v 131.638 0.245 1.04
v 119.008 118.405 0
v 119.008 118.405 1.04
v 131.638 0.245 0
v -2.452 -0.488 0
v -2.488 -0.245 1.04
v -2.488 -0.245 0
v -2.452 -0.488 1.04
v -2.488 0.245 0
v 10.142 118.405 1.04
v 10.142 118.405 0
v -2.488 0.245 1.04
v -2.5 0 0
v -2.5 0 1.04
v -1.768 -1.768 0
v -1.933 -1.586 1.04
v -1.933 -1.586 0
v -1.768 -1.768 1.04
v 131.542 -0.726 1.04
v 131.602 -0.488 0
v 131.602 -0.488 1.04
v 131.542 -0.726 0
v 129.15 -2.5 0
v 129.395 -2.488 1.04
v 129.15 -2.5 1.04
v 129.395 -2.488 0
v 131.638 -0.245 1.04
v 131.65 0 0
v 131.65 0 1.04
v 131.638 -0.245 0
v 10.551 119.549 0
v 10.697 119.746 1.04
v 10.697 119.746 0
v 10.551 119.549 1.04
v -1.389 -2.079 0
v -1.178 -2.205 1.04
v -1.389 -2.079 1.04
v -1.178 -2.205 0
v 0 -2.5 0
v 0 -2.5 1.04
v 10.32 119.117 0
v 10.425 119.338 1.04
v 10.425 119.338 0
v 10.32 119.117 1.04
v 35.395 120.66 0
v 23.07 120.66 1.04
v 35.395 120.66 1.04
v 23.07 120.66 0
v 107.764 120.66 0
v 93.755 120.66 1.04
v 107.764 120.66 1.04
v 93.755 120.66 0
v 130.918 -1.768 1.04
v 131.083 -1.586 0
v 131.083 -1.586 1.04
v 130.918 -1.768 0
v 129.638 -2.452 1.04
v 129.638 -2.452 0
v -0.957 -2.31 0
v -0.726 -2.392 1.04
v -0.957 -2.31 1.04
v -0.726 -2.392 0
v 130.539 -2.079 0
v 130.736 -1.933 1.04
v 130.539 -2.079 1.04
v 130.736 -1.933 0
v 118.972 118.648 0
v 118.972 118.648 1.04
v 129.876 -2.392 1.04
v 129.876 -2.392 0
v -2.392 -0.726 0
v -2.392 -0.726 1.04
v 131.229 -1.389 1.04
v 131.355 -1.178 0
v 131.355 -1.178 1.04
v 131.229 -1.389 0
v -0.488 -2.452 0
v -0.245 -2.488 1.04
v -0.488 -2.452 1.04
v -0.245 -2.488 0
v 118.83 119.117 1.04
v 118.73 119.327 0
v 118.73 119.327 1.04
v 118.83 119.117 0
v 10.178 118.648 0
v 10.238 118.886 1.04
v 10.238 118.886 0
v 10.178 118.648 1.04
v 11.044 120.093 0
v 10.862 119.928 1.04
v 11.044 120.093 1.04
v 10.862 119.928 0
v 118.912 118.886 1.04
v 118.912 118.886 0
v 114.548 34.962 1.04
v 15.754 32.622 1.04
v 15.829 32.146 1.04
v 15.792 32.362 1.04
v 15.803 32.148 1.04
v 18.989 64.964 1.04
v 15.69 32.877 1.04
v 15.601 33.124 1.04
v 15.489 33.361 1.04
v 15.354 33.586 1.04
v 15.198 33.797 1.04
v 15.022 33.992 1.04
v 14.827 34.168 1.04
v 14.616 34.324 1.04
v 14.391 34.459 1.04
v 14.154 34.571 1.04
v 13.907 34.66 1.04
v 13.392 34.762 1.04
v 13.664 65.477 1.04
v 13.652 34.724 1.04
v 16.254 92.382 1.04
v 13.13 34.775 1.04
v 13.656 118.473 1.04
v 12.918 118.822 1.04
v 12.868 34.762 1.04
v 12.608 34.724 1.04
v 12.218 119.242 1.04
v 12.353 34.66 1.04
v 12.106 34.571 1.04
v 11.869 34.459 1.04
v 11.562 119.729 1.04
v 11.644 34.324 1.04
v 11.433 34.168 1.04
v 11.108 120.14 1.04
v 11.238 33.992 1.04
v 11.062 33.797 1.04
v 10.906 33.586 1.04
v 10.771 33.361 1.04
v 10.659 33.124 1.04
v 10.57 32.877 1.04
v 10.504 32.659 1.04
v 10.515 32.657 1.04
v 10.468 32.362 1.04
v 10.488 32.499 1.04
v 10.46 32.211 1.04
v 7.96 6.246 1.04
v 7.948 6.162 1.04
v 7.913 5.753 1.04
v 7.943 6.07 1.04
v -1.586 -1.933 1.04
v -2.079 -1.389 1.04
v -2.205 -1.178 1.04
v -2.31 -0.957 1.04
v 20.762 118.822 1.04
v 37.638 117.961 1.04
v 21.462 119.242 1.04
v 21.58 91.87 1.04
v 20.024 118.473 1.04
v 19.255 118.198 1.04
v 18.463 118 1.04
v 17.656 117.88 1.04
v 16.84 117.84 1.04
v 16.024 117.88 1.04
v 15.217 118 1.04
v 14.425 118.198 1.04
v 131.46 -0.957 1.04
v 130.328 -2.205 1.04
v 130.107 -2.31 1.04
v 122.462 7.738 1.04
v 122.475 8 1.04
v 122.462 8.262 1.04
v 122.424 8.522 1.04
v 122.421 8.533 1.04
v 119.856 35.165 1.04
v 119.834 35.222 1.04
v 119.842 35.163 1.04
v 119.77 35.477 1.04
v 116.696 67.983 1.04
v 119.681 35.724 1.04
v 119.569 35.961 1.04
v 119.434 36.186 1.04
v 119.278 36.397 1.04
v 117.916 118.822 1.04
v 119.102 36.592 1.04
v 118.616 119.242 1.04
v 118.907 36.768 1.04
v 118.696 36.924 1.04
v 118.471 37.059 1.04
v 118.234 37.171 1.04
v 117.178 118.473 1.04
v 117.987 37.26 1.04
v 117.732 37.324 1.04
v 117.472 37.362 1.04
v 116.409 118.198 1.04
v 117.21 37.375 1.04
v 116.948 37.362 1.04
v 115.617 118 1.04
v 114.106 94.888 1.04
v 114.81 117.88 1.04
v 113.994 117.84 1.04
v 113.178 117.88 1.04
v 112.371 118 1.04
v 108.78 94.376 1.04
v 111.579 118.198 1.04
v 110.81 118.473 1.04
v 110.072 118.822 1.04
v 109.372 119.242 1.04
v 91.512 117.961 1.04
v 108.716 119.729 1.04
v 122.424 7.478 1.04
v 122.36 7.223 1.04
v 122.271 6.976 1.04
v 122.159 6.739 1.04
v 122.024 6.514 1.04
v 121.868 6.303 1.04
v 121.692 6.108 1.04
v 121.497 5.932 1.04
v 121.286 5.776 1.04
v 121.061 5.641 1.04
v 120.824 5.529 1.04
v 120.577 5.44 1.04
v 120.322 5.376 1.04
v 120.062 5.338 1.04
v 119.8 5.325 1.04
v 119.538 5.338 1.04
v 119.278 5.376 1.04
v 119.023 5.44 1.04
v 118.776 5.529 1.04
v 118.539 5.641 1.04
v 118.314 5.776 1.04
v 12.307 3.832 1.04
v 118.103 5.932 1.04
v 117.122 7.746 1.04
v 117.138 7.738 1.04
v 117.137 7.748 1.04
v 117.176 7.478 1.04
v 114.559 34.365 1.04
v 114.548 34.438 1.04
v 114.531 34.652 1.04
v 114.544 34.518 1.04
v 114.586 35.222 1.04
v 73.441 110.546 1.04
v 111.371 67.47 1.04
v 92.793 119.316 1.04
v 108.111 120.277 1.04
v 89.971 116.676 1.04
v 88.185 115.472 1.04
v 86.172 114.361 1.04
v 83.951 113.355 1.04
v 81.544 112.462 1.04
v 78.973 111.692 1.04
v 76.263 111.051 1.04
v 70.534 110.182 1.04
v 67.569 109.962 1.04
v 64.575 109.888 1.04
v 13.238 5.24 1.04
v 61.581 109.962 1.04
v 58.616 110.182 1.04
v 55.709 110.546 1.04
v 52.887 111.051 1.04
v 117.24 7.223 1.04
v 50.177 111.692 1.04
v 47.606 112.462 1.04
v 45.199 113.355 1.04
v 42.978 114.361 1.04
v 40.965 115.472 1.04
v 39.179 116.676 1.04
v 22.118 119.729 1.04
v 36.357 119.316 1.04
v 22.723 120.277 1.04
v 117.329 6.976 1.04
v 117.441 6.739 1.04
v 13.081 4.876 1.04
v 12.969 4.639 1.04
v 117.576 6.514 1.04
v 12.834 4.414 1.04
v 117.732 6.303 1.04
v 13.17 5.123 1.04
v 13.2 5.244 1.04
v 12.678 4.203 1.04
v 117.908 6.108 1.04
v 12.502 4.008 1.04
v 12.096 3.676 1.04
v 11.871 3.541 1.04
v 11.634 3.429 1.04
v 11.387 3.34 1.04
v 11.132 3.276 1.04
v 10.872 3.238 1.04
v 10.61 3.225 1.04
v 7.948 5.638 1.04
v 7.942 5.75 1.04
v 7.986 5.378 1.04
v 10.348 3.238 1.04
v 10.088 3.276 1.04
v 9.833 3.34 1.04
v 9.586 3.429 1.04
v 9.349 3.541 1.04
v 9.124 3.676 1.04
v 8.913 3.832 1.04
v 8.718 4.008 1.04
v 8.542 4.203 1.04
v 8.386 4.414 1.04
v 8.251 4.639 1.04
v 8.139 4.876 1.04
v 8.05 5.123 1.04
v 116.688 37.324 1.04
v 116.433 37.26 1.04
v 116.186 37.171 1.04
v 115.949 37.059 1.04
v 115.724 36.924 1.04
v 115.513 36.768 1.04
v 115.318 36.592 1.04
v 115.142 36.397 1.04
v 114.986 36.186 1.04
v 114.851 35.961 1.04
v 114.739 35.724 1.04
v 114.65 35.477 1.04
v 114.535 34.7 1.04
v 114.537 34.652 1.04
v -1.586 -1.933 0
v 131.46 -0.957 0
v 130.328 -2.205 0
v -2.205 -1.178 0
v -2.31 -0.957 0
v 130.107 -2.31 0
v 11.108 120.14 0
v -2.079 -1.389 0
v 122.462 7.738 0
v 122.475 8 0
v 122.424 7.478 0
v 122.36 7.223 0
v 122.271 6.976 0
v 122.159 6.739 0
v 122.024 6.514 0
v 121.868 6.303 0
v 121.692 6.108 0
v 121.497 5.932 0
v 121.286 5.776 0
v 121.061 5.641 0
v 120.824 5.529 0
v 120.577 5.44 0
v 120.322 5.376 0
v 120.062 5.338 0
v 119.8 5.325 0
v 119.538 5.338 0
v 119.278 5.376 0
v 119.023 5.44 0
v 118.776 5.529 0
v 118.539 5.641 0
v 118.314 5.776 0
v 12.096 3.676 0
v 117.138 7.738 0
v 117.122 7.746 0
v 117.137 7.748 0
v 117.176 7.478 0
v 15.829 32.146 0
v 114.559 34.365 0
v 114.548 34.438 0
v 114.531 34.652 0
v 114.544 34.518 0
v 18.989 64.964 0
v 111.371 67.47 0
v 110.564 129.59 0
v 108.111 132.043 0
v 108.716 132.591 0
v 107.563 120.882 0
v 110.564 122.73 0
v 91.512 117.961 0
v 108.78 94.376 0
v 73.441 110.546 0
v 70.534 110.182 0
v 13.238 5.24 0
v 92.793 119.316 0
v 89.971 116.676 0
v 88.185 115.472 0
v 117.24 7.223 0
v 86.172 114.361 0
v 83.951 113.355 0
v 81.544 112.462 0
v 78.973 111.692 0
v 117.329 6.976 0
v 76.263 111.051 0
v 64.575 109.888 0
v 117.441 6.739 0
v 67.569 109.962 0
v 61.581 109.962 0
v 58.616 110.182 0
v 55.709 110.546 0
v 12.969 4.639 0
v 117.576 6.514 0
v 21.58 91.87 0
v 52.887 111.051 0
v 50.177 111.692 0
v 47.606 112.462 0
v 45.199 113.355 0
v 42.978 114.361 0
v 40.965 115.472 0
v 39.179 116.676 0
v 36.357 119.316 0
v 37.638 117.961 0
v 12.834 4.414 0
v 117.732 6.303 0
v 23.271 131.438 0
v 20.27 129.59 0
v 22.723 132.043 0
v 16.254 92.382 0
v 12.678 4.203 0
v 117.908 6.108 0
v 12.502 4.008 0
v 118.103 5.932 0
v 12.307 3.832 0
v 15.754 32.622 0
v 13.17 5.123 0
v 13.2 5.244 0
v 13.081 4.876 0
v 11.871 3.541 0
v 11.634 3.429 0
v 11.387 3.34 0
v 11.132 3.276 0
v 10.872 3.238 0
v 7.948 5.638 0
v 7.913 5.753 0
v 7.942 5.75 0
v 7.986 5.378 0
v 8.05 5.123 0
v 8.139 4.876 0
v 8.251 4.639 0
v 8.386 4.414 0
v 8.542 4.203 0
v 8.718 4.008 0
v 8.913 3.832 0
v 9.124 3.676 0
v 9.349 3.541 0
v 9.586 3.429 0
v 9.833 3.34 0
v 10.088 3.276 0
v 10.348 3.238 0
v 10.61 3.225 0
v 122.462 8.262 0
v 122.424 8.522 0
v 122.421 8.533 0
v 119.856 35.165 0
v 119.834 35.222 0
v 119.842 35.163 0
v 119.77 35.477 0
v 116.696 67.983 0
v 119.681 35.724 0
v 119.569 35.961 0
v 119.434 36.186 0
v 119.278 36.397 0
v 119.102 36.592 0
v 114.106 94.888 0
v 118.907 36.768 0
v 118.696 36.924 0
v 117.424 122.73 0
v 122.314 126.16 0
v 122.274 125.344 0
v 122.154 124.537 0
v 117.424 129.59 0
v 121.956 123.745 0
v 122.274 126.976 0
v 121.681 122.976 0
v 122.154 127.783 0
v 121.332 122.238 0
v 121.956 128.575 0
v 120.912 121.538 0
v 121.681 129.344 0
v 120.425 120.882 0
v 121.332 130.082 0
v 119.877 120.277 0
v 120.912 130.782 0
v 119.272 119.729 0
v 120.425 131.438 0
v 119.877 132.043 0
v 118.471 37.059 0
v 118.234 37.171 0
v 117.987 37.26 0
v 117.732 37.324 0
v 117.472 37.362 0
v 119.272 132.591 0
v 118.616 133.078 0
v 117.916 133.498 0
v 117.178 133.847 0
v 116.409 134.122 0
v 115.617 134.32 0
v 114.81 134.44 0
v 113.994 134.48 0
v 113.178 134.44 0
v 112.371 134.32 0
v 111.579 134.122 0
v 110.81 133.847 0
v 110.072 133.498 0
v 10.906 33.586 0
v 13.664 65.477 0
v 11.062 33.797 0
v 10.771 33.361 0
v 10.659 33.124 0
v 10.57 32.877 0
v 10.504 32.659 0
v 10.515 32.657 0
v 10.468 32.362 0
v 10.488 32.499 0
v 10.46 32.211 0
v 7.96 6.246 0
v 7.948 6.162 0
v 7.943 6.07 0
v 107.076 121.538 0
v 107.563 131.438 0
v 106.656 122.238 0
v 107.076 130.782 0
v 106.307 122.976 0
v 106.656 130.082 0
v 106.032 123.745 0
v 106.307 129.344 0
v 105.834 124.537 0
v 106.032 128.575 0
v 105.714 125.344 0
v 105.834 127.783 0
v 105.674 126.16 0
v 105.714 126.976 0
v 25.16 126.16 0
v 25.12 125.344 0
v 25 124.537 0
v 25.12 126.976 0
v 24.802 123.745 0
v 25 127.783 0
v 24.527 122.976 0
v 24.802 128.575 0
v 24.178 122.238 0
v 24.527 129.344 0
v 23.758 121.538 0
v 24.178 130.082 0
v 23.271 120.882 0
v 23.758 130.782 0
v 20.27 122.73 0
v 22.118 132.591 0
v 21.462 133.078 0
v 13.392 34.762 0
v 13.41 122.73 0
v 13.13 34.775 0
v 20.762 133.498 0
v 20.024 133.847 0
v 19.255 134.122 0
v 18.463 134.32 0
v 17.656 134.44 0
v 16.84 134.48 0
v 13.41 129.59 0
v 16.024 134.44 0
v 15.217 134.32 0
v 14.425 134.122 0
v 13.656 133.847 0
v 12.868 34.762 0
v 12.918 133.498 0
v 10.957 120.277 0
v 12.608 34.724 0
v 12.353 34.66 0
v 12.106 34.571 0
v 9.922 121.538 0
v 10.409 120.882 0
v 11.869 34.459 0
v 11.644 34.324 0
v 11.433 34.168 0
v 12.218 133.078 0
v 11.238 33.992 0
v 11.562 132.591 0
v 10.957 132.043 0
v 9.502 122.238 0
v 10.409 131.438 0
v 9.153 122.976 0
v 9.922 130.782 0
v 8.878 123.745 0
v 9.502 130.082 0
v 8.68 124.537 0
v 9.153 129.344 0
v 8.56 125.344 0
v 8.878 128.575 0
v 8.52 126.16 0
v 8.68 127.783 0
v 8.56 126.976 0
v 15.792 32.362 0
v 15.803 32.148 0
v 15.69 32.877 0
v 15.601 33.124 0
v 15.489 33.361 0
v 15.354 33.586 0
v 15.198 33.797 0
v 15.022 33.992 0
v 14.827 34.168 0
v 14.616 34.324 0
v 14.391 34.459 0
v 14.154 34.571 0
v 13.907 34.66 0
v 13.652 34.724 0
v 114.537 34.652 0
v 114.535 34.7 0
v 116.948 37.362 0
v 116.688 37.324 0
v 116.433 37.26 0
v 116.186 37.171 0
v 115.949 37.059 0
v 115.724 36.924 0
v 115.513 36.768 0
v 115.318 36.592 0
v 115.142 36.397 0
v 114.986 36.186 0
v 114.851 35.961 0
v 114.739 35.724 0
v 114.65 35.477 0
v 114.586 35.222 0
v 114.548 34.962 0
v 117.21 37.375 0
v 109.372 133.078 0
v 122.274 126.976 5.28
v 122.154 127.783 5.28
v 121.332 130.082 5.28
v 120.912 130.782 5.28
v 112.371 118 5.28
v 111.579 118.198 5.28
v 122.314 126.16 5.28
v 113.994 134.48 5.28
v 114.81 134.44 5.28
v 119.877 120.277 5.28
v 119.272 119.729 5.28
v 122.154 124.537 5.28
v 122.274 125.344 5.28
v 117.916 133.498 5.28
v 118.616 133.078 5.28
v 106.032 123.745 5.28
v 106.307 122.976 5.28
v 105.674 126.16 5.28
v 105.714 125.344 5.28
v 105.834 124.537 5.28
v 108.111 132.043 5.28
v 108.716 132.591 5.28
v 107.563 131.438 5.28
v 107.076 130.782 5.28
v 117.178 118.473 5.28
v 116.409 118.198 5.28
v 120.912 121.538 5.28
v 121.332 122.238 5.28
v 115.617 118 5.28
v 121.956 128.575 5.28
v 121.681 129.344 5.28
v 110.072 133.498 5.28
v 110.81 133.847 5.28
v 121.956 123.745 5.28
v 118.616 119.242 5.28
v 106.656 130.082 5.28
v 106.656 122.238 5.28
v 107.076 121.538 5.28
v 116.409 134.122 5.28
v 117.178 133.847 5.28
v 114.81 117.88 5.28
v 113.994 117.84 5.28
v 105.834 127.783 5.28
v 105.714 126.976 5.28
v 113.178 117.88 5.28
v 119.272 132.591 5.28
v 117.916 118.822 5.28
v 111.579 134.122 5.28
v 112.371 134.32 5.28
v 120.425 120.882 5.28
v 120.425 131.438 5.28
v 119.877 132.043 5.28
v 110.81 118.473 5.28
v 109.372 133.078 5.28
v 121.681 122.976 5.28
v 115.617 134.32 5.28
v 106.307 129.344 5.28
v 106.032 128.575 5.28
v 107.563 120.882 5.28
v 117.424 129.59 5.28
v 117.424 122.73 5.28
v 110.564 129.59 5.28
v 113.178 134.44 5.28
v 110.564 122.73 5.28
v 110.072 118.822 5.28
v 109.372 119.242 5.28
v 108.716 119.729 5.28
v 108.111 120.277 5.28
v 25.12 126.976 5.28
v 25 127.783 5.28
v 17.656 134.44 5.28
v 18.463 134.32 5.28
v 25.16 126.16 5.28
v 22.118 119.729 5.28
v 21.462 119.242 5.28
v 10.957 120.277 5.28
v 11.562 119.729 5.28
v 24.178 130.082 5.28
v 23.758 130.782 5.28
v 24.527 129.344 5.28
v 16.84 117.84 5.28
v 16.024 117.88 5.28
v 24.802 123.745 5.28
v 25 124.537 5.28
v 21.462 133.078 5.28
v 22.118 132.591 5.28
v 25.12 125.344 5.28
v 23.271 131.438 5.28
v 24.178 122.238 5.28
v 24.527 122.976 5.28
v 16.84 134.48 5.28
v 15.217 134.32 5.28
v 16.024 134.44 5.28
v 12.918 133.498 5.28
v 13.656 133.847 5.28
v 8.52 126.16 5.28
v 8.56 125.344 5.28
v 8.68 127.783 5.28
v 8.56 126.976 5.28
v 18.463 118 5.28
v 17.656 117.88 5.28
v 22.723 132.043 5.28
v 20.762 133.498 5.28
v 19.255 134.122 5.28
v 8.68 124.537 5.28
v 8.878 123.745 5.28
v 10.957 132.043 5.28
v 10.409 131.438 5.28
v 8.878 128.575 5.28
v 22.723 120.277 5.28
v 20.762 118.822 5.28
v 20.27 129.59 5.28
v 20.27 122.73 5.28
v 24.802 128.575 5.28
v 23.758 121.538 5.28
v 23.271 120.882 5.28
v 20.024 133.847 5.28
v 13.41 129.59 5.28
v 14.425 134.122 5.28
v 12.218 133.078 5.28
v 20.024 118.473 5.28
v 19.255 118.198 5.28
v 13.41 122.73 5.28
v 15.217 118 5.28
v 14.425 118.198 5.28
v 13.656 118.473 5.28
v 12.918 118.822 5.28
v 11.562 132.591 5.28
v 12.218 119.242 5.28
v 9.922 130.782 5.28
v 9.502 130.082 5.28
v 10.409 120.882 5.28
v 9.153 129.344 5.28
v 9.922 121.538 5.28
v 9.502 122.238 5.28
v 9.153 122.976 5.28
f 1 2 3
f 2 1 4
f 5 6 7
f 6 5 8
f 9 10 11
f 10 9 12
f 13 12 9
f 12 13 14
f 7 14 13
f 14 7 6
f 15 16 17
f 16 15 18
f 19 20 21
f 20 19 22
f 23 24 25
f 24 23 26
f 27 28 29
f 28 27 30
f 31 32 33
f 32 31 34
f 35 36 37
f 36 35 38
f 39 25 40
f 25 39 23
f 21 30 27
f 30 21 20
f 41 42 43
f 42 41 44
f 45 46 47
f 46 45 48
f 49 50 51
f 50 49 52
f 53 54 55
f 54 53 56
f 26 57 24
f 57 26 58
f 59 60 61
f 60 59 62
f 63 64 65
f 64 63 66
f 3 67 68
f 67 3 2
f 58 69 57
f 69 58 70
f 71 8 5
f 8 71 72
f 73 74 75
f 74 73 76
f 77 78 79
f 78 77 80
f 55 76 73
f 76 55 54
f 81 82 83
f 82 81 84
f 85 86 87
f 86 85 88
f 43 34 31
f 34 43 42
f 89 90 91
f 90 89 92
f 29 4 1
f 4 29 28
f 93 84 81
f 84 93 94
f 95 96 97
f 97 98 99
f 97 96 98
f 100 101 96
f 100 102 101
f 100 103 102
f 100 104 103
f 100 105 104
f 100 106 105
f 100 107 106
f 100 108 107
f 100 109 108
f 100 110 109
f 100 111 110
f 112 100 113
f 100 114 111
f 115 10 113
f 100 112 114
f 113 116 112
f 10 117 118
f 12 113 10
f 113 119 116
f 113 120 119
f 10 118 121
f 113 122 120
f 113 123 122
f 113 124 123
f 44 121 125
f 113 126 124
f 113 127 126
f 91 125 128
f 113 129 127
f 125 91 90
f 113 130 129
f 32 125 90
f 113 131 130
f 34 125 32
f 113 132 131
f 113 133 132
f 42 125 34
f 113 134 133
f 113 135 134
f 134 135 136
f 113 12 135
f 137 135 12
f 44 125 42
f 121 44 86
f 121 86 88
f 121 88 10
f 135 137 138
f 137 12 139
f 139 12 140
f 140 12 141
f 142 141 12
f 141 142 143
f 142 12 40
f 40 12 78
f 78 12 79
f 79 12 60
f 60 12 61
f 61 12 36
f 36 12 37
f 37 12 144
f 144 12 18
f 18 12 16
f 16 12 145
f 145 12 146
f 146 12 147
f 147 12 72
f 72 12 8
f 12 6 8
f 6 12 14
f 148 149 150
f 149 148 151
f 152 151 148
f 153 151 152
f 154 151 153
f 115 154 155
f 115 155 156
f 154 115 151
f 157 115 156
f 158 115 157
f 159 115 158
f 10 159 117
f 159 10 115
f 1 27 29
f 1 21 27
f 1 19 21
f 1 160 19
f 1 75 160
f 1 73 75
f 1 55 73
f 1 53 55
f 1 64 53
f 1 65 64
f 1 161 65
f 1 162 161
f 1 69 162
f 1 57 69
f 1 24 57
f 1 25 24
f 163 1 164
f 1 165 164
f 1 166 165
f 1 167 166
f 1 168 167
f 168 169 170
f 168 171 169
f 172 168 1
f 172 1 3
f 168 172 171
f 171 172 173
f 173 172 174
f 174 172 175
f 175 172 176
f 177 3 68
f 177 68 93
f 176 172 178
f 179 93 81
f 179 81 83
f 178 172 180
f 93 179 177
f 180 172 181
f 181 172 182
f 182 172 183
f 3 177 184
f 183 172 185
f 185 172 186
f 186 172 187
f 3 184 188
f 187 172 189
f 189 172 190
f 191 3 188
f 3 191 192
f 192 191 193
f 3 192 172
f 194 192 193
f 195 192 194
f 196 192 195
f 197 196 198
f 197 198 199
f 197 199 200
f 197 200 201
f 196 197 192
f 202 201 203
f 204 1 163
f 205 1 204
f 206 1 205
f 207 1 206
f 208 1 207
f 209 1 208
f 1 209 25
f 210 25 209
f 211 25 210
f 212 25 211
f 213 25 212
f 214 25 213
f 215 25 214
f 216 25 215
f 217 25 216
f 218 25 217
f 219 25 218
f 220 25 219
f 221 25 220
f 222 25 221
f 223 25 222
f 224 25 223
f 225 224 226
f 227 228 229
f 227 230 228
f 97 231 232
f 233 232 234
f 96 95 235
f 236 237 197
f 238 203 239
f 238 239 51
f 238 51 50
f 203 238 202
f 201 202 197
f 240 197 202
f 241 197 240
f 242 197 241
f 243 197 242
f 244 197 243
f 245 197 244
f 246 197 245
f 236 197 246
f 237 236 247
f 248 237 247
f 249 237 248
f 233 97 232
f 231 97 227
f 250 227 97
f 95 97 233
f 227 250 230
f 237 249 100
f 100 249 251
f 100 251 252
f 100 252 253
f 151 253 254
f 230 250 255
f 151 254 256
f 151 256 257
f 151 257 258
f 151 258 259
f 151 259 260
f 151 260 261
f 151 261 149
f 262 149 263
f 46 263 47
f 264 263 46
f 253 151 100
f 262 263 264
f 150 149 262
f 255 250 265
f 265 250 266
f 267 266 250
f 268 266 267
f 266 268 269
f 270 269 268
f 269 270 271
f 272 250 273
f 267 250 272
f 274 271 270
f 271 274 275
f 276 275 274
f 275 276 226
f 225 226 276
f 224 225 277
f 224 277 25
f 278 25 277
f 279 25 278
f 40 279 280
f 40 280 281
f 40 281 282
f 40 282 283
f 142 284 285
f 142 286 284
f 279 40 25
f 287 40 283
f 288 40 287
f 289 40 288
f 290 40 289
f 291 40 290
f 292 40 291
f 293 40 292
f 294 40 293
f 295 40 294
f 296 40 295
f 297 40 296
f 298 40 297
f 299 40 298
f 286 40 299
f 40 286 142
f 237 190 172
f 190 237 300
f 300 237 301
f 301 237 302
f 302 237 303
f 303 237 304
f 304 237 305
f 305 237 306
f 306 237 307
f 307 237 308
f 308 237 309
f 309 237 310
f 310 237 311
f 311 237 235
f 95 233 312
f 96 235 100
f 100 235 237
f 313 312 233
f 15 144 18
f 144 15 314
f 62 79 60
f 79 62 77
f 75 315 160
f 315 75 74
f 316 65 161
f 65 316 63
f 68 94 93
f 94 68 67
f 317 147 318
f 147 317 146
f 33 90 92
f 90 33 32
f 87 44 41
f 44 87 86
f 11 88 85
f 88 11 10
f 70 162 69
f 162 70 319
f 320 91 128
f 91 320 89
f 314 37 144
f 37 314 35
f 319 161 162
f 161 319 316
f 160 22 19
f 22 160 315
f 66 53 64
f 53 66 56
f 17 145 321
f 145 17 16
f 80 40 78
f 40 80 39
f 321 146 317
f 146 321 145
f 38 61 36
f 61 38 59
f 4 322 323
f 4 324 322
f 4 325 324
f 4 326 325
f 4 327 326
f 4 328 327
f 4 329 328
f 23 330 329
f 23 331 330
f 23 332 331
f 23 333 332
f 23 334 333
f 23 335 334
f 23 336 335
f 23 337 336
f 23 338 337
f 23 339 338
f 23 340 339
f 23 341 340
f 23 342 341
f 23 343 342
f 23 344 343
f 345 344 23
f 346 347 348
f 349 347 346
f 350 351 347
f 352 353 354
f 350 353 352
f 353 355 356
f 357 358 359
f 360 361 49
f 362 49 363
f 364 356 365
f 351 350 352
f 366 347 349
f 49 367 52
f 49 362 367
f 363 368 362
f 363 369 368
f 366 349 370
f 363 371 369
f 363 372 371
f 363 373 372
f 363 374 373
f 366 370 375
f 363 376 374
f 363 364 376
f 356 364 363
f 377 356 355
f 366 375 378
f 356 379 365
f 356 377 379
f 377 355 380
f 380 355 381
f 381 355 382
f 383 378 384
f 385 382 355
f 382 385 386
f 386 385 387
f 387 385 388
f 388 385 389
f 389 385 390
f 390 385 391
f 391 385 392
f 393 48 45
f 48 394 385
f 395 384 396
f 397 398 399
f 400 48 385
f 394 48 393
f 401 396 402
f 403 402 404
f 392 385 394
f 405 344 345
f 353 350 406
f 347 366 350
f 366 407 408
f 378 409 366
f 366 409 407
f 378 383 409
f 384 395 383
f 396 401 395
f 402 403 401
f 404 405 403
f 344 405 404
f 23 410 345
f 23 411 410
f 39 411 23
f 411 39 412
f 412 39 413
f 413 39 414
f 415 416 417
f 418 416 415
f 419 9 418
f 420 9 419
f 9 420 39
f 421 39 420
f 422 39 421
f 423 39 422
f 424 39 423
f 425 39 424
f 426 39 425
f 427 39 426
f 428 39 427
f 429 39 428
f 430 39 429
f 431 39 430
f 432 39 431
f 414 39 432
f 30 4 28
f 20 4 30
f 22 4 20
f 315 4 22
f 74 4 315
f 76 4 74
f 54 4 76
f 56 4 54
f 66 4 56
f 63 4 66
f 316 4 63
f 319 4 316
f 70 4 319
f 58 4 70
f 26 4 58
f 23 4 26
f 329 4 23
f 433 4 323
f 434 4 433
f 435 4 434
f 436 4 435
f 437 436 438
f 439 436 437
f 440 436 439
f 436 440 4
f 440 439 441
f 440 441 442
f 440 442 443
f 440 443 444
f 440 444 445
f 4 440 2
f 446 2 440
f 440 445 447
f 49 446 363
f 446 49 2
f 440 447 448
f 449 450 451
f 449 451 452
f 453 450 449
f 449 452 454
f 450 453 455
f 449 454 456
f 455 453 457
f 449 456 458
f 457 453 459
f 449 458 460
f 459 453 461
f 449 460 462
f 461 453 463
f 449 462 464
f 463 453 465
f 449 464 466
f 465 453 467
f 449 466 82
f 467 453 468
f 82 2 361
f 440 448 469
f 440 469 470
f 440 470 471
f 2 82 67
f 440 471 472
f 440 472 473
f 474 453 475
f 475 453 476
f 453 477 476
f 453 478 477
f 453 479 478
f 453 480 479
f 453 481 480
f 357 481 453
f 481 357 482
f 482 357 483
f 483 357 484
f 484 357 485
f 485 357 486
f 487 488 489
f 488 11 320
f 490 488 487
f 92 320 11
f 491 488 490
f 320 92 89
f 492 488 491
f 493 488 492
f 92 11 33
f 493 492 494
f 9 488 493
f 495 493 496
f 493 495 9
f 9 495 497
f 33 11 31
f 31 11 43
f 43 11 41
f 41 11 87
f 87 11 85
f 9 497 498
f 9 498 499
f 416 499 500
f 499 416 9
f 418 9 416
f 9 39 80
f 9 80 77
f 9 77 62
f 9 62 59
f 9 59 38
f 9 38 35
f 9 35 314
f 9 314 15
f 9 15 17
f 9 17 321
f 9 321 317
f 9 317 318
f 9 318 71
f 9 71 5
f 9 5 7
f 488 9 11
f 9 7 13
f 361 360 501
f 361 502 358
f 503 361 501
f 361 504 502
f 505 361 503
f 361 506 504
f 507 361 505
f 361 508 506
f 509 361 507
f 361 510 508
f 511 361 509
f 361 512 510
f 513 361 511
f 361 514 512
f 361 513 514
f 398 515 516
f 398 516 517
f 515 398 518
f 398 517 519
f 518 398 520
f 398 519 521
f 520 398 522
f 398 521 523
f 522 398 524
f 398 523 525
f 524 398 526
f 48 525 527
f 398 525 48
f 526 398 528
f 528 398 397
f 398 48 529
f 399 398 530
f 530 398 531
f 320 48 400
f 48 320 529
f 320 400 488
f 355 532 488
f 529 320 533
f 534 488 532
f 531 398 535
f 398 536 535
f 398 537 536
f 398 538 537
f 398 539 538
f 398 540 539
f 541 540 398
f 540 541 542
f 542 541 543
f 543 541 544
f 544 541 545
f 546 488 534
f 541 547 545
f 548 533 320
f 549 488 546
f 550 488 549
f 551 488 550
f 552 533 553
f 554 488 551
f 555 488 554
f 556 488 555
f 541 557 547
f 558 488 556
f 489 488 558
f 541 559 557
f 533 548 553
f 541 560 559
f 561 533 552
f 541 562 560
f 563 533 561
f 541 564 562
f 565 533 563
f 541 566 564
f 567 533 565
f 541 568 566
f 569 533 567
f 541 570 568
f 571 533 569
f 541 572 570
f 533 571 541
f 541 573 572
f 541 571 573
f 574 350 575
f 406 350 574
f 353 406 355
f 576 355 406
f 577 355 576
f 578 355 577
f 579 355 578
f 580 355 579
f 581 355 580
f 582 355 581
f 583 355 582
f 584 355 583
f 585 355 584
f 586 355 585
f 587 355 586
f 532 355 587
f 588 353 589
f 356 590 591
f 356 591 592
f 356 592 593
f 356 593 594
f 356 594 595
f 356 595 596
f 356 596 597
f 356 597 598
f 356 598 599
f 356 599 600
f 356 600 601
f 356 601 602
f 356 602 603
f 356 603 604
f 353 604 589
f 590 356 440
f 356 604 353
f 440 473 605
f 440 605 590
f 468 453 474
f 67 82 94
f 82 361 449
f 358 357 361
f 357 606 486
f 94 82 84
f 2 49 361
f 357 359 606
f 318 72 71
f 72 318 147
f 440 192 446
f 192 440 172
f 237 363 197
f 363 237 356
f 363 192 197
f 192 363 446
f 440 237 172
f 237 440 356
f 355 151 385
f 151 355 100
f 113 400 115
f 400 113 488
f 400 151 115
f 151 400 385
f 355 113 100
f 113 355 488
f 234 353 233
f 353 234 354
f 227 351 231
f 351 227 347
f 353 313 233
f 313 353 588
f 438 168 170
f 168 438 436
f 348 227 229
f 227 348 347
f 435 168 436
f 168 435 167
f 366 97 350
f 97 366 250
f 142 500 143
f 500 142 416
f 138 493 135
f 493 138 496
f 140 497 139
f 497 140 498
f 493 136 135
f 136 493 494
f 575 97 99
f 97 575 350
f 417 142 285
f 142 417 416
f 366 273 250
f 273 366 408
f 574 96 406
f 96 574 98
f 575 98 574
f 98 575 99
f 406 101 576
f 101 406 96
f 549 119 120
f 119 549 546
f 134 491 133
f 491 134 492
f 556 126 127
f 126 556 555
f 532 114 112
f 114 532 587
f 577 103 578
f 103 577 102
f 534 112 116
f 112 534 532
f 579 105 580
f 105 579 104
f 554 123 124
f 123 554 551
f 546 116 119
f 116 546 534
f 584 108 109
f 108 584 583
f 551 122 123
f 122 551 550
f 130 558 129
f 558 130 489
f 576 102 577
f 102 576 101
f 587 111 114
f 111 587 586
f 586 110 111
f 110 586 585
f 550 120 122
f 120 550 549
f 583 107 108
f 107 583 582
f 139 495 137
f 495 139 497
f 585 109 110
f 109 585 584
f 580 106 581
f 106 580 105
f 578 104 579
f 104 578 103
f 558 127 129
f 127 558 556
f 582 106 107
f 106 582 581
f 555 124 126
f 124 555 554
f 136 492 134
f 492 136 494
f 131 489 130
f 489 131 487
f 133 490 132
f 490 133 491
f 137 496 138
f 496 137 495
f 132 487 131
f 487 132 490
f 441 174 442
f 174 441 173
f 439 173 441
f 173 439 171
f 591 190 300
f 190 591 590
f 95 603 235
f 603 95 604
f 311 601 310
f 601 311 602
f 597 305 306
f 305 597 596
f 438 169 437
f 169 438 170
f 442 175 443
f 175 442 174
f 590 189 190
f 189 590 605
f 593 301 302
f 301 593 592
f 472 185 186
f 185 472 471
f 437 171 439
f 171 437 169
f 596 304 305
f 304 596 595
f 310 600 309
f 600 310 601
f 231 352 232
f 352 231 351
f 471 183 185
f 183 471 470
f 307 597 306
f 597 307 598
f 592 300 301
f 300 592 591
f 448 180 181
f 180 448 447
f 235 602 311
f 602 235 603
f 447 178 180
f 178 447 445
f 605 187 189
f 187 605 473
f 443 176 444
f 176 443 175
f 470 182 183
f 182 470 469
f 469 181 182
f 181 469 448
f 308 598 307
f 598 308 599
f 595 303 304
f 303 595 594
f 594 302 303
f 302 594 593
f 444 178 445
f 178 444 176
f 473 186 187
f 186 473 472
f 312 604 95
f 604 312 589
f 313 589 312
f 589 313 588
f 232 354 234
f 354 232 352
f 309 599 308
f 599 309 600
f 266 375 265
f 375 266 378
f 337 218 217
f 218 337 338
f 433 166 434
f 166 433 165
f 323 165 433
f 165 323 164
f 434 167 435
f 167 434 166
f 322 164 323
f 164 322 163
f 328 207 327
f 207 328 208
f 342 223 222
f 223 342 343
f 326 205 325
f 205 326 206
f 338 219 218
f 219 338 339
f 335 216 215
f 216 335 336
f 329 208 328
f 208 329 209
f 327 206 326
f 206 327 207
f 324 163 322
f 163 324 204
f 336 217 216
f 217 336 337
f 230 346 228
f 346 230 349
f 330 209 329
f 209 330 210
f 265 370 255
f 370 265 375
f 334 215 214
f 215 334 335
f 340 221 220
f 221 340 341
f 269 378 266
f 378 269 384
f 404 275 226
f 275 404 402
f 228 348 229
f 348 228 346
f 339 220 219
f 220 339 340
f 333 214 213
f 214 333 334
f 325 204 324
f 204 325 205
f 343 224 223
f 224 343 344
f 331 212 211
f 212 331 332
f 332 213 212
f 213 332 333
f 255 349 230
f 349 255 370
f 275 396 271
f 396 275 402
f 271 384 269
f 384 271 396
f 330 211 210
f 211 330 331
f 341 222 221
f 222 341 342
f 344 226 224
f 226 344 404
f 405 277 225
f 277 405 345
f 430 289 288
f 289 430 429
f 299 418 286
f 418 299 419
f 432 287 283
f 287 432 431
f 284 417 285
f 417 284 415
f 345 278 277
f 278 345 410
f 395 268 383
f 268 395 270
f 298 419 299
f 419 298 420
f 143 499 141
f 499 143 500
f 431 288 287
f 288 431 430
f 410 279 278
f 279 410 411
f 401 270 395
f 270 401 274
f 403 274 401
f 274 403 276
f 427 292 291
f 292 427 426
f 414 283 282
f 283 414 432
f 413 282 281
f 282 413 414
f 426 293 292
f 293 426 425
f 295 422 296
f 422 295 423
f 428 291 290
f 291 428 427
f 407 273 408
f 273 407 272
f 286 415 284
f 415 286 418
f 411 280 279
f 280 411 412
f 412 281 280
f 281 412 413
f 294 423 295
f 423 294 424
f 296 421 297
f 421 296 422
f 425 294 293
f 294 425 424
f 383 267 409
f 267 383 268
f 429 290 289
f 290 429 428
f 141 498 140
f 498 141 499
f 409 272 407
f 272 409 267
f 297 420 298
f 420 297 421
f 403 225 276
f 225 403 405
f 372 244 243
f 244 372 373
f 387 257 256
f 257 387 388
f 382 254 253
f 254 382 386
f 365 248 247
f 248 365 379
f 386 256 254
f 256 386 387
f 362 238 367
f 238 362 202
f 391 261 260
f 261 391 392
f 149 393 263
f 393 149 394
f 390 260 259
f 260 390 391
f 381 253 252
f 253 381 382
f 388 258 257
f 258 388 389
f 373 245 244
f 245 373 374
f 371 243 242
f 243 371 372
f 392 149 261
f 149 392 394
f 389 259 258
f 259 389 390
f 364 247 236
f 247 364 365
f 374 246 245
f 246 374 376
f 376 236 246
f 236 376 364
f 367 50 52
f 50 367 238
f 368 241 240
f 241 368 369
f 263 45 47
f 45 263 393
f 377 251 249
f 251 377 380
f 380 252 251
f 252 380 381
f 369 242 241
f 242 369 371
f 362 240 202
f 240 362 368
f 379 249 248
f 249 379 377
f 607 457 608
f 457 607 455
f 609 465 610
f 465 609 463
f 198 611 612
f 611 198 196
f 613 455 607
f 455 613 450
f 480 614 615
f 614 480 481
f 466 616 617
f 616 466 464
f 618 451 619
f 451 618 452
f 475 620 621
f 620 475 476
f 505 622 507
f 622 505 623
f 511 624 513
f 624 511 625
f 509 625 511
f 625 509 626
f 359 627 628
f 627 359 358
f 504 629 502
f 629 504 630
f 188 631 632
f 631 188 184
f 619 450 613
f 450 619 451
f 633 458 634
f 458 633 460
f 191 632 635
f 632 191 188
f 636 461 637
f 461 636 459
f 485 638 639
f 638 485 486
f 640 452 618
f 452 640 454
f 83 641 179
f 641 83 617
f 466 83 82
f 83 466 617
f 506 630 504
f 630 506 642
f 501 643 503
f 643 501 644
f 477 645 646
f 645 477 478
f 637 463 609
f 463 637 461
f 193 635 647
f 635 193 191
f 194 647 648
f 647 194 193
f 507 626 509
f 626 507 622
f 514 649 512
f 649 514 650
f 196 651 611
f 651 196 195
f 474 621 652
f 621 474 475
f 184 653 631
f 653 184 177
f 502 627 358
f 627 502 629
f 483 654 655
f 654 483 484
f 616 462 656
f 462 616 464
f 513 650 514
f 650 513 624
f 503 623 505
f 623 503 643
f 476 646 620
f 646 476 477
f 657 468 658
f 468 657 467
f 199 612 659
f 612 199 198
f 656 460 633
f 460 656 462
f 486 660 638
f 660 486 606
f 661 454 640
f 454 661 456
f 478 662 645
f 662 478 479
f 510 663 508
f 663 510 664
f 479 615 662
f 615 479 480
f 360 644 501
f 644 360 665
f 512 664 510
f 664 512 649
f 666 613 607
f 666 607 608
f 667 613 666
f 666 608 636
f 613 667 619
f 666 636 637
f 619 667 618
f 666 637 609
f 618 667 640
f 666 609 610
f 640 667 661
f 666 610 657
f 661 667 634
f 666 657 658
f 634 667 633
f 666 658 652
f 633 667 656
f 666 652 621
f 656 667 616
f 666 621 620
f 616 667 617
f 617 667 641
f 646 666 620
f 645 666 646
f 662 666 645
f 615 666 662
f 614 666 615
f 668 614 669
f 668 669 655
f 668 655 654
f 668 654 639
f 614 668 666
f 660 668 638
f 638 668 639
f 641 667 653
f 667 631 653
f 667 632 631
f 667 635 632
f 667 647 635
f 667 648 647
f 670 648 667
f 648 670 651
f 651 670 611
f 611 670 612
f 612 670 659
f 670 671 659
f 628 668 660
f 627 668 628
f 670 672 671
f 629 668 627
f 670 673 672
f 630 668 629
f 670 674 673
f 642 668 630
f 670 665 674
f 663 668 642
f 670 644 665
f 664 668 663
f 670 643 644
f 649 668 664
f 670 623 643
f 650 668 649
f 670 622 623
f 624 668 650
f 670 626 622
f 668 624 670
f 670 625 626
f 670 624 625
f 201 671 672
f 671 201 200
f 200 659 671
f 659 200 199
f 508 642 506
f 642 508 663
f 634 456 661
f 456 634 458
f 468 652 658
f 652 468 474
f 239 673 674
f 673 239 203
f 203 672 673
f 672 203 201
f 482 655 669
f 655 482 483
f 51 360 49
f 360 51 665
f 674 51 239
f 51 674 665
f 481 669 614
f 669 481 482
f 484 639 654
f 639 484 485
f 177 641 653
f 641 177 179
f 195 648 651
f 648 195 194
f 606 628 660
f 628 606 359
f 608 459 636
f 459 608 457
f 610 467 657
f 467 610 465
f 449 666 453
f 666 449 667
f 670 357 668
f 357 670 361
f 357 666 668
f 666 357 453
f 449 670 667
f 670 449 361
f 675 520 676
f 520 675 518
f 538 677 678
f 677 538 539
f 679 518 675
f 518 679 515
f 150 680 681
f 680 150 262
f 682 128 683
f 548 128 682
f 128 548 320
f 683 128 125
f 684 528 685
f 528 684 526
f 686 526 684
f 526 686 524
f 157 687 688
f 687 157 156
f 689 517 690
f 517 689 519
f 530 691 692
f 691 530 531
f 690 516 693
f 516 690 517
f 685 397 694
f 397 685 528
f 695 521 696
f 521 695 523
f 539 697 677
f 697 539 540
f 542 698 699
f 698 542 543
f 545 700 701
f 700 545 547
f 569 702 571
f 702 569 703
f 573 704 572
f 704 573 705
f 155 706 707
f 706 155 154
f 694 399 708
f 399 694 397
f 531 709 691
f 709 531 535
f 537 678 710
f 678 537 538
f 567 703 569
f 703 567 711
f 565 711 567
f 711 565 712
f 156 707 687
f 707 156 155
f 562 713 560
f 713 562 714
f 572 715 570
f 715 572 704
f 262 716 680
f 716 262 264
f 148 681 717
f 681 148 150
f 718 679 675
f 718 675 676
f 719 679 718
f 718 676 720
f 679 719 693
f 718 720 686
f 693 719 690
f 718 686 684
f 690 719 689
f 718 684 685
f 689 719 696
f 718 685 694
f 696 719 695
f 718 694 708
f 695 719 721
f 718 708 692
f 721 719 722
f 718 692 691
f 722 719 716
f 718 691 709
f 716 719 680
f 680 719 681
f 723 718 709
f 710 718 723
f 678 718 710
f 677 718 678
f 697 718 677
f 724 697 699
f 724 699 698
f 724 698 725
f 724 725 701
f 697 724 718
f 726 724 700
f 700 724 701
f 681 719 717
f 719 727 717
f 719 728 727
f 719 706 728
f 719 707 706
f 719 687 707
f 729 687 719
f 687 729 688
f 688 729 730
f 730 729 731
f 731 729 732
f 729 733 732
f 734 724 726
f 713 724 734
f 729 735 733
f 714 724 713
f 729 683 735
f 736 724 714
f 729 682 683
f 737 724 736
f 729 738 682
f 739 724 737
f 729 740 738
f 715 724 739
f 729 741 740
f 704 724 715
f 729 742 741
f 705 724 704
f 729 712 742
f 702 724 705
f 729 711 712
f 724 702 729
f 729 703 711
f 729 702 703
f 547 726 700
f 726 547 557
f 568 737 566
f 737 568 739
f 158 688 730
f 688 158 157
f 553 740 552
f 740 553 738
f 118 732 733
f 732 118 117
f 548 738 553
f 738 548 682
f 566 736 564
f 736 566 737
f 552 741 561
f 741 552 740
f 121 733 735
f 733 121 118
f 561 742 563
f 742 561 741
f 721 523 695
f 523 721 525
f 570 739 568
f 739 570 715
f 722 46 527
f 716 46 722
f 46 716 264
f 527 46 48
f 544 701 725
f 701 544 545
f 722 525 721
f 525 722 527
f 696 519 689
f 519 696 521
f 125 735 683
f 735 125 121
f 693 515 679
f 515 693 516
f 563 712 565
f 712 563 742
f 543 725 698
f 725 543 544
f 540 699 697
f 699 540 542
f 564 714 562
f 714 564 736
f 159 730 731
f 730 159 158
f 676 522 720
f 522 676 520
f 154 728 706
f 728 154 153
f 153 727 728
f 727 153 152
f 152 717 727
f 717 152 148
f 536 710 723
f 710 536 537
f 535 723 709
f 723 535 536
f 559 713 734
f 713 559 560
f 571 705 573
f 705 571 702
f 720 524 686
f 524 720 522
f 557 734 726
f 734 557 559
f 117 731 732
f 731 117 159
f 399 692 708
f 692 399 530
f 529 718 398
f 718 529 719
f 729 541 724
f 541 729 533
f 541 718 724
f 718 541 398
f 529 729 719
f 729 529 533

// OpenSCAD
// Parameters
// Forearm Width 1 (mm)
$fn = 64;

width1 = 129.15; //[45:175]

// Forearm Width 2 (mm)
width2 = 103.89; //[25:155]

// Forearm Length 1 (mm)
length1 = 118.16; //[35:165]

// Forearm Origin (mm)
origin = 0;

// Forearm Height (smallest) (mm)
heightSmall = 1.04; //[.75:1.25]
 
// Diameter fillet (mm)
diameter = 5; //[3:7]


//Add the circle ports 
radius = 8.32; //[3:12]
yShift = 7; //[4:13]

//square cutout for circle ports
squareRad = 6.86; //[3:10]

//linear extrude of circle ports (mm)
//trying to put the variable in terms of height of the base of the trapezoid
circExtrude = heightSmall*5.07692307692;




// Fillet edges
difference()
difference()
difference()
difference()
difference()
difference()
difference()
difference()
{
{
{
{
{
{
{
{
difference(){
linear_extrude(height=heightSmall)
hull() { 
    translate([origin,origin]) circle(d=diameter);
    translate([width1,origin]) circle(d=diameter);
    translate([(width1-width2)/2+width2,length1]) circle(d=diameter);
    translate([(width1-width2)/2,length1]) circle(d=diameter);
    
    
    polygon(points=[[origin,origin],[width1,origin],[(width1-width2)/2+width2,length1],[(width1-width2)/2,length1]]); 
    
    cylinder(d=diameter, h=heightSmall); 
 }
 }
 // Instead of putting coordinates, I used the coordinates already in place and divided the coordinate value by the respective dimension (width1 for x values, length1 for y values), and multiplied this ratio by the respective dimension so the location of the rectangle will scale properly. (the only problem is that the locations only scale w/ respect to width1 and not width2)
 
 // Right now, the rectangular ports are slightly offset with one higher than the other. We're trying to make it symmetrical but can't figure it out. That is the next step. 
  rotate(5.5)
 translate([0.92915214866*width1,0.59241706161*length1]){
cube([5.35,27.03,3*circExtrude],true);}
 }
  rotate(-5.5)
  translate([0.07742934572*width1,0.67704807041*length1]){
cube([5.35,27.03,3*circExtrude],true);}
 }
   rotate(5.5)
   translate([0.92915214866*width1,0.0846310088*length1]){
cube([5.35,27.03,3*circExtrude],true);}
 }
 rotate(-5.5)
   translate([0.07742934572*width1,0.1692620176*length1]){
cube([5.35,27.03,3*circExtrude],true);}

translate([0.07742934572*width1+3.13,0.1692620176*length1+12.1])
cylinder(circExtrude*3,5.35/2,5.35/2);}

translate([0.07742934572*width1+107.21,0.1692620176*length1+14.7])
cylinder(circExtrude*3,5.35/2,5.35/2);}

translate([0.07742934572*width1+109.8,0.1692620176*length1-12])
cylinder(circExtrude*3,5.35/2,5.35/2);}  

translate([0.07742934572*width1+.61,0.1692620176*length1-14.1])
cylinder(circExtrude*3,5.35/2,5.35/2);}  

// Not correct, needs to be corrected
 
 //cutout for the groove 
    translate([width1/2,7+length1])
    scale([1,.5]) sphere(30.58, center = true);

 }
 ; 
//Need to still figure out exact location of these circle ports in relation to rest of body

//Right port
difference()
 {
linear_extrude(height=circExtrude)   
translate([(width1-width2)/2.5+width2,8+length1]) 
circle(radius); 
translate([(width1-width2)/2.5+width2,8+length1]){
cube([squareRad,squareRad,3*circExtrude],true);
    }
    

    
 }
 //Left Port
 difference()
 {
linear_extrude(height=circExtrude)  
translate([(width1-width2)/1.5,8+length1])
circle(radius);

translate([(width1-width2)/1.5,8+length1]){
cube([squareRad,squareRad,3*circExtrude],true);
    }
    
}
;
